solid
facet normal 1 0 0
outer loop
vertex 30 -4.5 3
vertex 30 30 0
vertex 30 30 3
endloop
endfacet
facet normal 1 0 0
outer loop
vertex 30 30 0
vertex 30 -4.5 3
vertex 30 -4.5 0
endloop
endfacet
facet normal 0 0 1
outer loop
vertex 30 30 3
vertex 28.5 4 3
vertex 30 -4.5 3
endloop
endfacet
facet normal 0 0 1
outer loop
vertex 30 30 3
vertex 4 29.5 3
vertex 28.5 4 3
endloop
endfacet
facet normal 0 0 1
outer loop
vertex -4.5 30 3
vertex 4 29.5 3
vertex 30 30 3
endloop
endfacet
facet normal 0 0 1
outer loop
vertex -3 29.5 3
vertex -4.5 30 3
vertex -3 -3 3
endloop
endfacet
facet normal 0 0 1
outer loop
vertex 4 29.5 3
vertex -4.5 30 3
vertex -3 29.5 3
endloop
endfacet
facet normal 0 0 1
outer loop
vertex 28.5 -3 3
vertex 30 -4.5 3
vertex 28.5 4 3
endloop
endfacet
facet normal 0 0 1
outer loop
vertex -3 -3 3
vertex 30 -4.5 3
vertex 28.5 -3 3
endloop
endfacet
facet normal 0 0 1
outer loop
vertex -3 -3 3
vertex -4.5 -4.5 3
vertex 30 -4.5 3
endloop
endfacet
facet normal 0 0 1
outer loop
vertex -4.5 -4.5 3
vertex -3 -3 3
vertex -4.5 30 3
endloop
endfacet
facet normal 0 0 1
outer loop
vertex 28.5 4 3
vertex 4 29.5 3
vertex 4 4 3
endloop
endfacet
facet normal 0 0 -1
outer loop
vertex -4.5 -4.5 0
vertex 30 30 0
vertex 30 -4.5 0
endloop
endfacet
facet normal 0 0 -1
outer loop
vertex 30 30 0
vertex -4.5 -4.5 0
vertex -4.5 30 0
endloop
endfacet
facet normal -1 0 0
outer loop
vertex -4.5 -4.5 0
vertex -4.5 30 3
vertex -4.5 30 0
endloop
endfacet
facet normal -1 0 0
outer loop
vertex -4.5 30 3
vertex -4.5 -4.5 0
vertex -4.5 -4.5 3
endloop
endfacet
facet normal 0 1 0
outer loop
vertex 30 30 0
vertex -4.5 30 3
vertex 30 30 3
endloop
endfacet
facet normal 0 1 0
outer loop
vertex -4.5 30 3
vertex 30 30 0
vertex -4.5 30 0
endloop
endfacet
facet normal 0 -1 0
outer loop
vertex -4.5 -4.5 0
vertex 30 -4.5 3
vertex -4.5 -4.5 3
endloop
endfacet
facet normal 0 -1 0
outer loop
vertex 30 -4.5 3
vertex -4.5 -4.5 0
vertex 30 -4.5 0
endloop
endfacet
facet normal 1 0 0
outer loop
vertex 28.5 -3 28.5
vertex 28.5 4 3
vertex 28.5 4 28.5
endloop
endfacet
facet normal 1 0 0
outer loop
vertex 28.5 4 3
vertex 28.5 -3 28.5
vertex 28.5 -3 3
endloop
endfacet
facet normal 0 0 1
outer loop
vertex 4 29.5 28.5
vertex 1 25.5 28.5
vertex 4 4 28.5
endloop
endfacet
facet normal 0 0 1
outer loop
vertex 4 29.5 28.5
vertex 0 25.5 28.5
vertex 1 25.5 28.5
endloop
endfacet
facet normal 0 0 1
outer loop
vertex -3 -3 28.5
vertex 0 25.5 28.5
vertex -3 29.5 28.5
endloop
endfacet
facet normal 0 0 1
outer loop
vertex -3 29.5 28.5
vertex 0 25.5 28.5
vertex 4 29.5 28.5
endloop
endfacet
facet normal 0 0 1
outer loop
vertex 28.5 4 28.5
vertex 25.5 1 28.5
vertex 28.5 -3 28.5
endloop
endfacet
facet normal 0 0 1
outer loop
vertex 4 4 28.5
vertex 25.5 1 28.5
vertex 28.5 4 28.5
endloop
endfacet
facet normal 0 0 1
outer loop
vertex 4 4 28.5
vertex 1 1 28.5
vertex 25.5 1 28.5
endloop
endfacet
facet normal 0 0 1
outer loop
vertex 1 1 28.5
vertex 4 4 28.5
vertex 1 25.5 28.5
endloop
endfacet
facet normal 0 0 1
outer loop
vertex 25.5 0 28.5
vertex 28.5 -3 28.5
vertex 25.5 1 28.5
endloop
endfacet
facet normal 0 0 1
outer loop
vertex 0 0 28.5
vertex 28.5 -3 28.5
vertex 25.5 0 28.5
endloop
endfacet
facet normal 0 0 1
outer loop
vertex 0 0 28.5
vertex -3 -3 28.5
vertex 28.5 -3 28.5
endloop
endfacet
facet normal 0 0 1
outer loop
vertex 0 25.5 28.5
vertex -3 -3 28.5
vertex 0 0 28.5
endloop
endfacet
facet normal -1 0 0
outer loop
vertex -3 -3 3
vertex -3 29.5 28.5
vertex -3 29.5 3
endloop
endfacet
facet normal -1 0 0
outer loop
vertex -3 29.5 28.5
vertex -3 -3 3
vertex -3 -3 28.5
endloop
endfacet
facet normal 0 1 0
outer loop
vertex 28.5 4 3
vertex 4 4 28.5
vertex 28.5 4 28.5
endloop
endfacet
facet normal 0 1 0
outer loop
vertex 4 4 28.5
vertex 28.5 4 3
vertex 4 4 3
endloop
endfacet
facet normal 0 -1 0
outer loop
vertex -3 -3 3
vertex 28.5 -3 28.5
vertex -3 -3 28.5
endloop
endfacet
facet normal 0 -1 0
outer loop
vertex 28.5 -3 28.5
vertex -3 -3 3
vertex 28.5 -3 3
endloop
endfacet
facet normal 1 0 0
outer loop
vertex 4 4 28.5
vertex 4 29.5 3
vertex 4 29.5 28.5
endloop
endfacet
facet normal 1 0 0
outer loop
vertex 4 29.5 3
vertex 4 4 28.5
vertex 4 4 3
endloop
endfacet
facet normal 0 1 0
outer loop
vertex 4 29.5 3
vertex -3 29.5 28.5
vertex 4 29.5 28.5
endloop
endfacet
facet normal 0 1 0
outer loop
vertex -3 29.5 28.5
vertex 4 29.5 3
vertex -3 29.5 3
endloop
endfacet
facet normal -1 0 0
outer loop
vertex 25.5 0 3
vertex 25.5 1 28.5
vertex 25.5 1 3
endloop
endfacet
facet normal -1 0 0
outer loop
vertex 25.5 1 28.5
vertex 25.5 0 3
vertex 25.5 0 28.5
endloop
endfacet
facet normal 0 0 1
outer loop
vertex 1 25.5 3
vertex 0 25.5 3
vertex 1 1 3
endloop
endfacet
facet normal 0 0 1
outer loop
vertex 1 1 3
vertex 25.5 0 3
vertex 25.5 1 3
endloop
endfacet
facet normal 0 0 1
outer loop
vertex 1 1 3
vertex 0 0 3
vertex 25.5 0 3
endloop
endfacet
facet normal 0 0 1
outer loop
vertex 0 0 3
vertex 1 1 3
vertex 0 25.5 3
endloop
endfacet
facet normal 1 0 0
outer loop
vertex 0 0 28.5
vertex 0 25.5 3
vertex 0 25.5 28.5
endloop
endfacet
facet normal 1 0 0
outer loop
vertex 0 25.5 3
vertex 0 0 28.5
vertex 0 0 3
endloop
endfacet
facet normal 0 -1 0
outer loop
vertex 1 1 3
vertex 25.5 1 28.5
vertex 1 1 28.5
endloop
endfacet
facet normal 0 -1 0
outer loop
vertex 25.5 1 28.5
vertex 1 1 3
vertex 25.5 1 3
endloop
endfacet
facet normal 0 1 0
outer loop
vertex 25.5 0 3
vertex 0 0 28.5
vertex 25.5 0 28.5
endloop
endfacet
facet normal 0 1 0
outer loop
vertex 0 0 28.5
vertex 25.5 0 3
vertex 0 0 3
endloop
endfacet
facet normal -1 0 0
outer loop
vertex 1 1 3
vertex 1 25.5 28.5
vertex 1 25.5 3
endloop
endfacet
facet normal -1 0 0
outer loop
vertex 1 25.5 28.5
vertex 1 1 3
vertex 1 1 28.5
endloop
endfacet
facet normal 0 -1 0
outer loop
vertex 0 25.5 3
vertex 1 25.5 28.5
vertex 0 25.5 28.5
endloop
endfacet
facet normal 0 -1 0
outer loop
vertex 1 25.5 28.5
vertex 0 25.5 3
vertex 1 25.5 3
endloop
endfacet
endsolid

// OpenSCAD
// Angle & Flat feet

// Side 1 (mm)
L1=25.5; //[1:51]
// Side 2 (mm)
L2=25.5; //[1:51]
// Height of foot (mm)
height=25.5; //[1:51]
// Thickness of steel (mm) - look at gauge tables for conversion 
T=1; //[0.2:3]
// Thickness of print (mm)
wall=3; //[1:5]

tolx=0.25;
module foot(){
    difference(){
        union(){
            translate([-1.5*wall,-1.5*wall,0])cube([L1+3*wall,L2+3*wall,wall]);
            translate([-wall,-wall,0])cube([L1+2*wall,2*wall+T,height+wall]);
            translate([-wall,-wall,0])cube([2*wall+T,L2+2*wall+T,height+wall]); }
        union(){
            translate([0,0,wall])cube([L1,T,height+tolx]);
            translate([0,0,wall])cube([T,L2,height+tolx]); }
        }
}

foot();
